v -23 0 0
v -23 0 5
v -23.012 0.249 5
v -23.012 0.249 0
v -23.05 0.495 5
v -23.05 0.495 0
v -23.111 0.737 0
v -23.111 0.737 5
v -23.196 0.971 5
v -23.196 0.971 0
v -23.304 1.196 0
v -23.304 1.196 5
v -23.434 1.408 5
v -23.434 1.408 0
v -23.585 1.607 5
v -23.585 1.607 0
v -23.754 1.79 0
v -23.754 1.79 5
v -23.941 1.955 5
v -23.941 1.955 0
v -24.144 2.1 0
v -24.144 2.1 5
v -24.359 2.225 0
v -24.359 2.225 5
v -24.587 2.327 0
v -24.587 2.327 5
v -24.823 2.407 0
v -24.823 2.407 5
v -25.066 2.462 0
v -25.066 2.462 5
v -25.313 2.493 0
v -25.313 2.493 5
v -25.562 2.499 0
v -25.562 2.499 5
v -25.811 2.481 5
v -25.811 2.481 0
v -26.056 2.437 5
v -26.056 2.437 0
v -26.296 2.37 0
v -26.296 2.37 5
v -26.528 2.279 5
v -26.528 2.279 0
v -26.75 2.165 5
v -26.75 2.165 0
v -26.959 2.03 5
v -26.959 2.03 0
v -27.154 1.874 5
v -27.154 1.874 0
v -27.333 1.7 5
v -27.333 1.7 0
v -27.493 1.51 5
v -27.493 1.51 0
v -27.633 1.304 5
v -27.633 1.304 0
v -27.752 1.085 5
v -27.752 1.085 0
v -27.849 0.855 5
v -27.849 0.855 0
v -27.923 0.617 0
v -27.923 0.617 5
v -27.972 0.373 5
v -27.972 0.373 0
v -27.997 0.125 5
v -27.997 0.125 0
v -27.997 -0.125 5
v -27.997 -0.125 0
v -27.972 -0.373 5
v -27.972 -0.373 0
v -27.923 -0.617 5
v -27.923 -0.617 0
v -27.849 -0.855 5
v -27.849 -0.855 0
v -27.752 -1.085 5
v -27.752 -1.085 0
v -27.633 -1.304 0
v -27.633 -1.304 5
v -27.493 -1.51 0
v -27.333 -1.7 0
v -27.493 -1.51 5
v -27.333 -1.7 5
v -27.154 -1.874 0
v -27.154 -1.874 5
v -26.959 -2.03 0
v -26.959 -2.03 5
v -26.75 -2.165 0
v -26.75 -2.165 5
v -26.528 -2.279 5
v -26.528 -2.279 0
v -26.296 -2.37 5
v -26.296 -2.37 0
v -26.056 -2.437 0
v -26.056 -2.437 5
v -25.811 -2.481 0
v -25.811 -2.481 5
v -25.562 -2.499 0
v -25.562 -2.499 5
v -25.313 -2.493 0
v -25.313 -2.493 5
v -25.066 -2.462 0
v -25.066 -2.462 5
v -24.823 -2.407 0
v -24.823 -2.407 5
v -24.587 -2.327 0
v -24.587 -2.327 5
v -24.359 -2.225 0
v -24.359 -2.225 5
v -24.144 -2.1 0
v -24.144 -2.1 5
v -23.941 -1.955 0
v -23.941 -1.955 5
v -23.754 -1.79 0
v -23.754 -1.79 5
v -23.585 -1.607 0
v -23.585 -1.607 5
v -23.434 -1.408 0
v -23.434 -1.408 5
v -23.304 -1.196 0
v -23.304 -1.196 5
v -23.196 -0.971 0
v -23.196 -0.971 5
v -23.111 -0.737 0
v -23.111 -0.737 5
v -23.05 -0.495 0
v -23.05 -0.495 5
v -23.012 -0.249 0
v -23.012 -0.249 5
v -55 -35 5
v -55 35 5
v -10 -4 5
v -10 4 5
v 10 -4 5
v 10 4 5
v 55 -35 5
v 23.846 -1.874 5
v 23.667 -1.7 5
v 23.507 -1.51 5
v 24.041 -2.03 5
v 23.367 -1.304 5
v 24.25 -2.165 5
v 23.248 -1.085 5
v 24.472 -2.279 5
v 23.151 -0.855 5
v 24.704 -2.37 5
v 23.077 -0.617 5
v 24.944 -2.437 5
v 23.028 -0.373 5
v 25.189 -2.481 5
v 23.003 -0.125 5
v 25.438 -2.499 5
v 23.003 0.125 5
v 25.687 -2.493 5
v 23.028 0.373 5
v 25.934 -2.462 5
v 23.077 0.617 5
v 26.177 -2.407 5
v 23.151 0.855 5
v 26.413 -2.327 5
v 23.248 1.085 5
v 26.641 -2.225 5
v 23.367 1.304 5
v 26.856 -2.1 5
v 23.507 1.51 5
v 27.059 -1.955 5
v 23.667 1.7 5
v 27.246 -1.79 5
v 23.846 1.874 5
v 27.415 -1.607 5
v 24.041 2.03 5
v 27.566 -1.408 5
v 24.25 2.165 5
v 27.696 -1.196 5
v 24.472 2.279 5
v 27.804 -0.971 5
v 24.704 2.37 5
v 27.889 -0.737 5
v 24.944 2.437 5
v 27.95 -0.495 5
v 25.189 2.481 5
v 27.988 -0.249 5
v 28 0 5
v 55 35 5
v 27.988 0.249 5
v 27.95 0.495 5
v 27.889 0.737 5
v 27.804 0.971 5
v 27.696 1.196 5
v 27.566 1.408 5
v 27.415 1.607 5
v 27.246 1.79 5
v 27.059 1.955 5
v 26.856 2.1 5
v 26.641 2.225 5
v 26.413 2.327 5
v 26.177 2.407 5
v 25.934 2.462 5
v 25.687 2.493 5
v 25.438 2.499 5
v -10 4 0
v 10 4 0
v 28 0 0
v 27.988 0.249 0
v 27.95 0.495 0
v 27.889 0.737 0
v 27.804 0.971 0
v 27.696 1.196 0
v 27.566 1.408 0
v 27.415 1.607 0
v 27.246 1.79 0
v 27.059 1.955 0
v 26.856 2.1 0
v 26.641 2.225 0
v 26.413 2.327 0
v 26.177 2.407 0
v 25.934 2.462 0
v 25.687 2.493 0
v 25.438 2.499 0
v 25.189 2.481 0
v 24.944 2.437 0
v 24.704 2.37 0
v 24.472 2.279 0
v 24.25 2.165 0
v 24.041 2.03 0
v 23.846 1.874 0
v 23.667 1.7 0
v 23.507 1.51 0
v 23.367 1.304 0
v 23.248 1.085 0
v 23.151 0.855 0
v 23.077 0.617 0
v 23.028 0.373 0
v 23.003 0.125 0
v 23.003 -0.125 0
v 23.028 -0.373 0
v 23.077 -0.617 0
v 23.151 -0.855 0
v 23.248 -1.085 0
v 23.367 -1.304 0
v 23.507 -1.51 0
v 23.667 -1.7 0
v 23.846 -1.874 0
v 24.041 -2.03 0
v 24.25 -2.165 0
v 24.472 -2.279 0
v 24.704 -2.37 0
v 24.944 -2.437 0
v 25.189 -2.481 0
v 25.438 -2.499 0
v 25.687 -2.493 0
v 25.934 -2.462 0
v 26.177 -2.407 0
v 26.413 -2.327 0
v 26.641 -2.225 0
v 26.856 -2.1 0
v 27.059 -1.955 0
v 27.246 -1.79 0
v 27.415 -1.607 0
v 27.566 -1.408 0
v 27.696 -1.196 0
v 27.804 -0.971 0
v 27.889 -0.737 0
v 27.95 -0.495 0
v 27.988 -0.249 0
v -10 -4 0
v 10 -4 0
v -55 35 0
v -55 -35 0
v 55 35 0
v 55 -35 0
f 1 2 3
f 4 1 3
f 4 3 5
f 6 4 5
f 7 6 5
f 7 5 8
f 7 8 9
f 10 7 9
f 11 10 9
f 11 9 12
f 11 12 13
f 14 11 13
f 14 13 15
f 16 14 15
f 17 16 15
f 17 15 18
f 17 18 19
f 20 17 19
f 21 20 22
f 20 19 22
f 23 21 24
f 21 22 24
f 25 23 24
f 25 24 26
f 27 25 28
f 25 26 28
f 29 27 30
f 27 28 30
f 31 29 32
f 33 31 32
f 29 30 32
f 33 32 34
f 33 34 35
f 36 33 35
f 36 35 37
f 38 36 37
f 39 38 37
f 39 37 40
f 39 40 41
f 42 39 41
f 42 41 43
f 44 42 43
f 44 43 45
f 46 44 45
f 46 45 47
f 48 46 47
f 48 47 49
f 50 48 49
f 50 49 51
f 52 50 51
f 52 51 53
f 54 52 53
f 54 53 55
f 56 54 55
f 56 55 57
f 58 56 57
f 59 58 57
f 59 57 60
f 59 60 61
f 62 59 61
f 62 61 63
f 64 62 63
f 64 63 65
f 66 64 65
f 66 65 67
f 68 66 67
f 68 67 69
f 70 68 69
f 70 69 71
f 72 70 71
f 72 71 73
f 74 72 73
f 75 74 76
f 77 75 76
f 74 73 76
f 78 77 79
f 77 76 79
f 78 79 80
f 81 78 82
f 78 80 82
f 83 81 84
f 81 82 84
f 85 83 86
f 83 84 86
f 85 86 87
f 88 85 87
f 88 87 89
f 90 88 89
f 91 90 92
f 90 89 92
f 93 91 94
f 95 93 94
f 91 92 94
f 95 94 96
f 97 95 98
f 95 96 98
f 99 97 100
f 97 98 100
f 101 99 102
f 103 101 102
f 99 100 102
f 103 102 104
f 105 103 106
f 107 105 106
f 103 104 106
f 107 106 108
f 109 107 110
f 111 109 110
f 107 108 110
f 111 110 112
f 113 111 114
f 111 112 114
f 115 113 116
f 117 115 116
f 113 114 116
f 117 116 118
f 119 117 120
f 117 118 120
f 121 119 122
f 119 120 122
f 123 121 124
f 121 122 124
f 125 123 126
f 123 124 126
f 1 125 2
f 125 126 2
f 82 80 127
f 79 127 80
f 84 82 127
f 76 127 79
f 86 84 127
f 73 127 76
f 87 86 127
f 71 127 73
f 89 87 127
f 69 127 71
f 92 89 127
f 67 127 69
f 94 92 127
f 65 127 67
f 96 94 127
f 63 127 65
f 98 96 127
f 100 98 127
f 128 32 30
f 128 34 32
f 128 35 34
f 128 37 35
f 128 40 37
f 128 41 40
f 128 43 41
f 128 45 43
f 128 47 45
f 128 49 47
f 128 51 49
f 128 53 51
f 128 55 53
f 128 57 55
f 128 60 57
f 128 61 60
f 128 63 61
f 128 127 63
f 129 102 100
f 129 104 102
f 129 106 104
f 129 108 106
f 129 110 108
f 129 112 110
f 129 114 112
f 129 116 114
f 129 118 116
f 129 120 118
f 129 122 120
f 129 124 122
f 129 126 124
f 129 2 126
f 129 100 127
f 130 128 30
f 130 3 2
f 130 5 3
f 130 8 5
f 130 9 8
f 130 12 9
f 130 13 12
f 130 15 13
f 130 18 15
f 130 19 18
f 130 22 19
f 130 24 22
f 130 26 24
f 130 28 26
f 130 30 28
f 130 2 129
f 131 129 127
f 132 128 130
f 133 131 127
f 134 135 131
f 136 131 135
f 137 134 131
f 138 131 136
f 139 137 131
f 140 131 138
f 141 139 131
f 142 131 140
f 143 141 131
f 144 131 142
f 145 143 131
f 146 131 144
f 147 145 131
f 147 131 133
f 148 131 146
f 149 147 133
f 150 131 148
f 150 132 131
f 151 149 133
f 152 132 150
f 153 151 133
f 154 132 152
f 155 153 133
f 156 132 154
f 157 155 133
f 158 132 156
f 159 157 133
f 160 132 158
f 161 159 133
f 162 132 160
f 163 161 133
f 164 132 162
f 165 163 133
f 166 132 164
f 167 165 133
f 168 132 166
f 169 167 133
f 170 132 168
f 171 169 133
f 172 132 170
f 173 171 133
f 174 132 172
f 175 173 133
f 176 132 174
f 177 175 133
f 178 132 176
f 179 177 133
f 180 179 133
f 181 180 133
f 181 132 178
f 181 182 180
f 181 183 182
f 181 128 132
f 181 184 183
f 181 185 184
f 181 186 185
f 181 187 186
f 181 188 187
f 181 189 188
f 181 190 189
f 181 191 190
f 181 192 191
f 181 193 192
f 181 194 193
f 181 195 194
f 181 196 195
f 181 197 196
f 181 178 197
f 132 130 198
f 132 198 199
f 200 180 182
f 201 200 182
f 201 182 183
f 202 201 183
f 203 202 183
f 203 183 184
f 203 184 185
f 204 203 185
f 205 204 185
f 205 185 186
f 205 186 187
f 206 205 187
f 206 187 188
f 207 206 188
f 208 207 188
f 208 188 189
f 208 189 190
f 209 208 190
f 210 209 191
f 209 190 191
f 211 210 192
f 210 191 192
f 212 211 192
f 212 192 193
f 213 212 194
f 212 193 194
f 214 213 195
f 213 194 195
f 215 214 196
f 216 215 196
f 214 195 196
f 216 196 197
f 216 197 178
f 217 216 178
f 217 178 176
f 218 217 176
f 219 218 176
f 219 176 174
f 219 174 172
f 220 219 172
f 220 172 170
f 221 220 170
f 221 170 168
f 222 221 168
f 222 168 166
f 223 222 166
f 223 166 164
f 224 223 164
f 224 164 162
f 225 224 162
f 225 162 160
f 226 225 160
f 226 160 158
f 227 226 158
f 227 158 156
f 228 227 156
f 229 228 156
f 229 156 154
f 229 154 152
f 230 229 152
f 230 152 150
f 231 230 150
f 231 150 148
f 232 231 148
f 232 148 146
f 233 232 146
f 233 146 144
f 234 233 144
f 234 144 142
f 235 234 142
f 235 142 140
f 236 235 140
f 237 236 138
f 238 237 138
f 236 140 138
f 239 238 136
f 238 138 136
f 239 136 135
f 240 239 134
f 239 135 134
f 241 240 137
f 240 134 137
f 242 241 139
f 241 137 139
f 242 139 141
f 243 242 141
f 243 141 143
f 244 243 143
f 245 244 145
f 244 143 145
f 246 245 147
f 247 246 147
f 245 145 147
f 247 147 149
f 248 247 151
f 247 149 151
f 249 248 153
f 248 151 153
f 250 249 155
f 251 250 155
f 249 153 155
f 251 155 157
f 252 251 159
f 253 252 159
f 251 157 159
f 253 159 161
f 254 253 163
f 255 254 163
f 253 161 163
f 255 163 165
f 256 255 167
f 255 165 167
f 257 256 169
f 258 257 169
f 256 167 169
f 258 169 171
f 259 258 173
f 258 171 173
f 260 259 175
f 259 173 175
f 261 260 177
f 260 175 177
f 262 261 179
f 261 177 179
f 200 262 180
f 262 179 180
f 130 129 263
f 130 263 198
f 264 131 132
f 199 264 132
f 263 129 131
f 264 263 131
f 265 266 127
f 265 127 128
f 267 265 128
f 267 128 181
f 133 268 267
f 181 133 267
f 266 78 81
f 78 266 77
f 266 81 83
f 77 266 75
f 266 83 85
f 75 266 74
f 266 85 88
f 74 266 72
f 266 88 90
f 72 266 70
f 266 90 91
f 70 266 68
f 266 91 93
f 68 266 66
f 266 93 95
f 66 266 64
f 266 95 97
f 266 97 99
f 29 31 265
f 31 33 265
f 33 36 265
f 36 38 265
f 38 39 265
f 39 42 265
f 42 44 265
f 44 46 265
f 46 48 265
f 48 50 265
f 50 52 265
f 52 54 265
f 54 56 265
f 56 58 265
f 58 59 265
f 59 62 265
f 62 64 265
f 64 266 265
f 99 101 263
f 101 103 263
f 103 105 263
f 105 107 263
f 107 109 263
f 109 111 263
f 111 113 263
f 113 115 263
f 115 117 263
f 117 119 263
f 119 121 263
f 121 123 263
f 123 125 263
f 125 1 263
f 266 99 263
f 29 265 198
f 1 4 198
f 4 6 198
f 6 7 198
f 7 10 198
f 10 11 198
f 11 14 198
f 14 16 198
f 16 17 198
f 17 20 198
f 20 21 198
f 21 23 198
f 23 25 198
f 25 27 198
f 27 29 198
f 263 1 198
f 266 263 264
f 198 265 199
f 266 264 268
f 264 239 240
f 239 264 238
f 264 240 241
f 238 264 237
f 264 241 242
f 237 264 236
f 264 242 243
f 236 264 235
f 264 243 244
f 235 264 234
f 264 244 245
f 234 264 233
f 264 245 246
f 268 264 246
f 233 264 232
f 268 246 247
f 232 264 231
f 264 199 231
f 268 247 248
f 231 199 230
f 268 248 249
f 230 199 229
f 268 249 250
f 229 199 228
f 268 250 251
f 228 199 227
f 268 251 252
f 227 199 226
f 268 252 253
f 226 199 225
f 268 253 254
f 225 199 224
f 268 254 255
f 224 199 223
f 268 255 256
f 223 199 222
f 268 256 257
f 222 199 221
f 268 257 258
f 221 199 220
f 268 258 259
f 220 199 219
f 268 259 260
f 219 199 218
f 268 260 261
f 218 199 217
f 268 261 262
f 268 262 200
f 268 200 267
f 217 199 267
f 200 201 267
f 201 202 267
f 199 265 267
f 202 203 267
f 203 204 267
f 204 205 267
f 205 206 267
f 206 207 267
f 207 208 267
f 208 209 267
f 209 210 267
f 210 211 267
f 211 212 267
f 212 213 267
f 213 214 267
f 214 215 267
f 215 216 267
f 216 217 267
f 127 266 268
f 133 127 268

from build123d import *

# Parameters (mm, degrees)
F0_W     = 110
F0_H     = 70
F1_DEPTH = 5
F2_W     = 20
F2_H     = 8
F3_DEPTH = 5.001
F4_R     = 2.5
F5_DEPTH = 5.001
F6_R     = 2.5
F7_DEPTH = 5.001


with BuildPart() as f1:
    # F0 (on Top) → F1 (new body)
    with BuildSketch(Plane.XY):
        Rectangle(F0_W, F0_H)
    extrude(amount=F1_DEPTH)

    # F2 (on face) → F3 (cut, through all)
    with BuildSketch(Plane.XY.offset(5)):
        Rectangle(F2_W, F2_H)
    extrude(amount=-F3_DEPTH, mode=Mode.SUBTRACT)

    # F4 (on face) → F5 (cut, through all)
    with BuildSketch(Plane.XY.offset(5)):
        with Locations((-25.5, 0)):
            Circle(F4_R)
    extrude(amount=-F5_DEPTH, mode=Mode.SUBTRACT)

    # F6 (on face) → F7 (cut, through all)
    with BuildSketch(Plane.XY.offset(5)):
        with Locations((25.5, 0)):
            Circle(F6_R)
    extrude(amount=-F7_DEPTH, mode=Mode.SUBTRACT)


solid = f1.part
